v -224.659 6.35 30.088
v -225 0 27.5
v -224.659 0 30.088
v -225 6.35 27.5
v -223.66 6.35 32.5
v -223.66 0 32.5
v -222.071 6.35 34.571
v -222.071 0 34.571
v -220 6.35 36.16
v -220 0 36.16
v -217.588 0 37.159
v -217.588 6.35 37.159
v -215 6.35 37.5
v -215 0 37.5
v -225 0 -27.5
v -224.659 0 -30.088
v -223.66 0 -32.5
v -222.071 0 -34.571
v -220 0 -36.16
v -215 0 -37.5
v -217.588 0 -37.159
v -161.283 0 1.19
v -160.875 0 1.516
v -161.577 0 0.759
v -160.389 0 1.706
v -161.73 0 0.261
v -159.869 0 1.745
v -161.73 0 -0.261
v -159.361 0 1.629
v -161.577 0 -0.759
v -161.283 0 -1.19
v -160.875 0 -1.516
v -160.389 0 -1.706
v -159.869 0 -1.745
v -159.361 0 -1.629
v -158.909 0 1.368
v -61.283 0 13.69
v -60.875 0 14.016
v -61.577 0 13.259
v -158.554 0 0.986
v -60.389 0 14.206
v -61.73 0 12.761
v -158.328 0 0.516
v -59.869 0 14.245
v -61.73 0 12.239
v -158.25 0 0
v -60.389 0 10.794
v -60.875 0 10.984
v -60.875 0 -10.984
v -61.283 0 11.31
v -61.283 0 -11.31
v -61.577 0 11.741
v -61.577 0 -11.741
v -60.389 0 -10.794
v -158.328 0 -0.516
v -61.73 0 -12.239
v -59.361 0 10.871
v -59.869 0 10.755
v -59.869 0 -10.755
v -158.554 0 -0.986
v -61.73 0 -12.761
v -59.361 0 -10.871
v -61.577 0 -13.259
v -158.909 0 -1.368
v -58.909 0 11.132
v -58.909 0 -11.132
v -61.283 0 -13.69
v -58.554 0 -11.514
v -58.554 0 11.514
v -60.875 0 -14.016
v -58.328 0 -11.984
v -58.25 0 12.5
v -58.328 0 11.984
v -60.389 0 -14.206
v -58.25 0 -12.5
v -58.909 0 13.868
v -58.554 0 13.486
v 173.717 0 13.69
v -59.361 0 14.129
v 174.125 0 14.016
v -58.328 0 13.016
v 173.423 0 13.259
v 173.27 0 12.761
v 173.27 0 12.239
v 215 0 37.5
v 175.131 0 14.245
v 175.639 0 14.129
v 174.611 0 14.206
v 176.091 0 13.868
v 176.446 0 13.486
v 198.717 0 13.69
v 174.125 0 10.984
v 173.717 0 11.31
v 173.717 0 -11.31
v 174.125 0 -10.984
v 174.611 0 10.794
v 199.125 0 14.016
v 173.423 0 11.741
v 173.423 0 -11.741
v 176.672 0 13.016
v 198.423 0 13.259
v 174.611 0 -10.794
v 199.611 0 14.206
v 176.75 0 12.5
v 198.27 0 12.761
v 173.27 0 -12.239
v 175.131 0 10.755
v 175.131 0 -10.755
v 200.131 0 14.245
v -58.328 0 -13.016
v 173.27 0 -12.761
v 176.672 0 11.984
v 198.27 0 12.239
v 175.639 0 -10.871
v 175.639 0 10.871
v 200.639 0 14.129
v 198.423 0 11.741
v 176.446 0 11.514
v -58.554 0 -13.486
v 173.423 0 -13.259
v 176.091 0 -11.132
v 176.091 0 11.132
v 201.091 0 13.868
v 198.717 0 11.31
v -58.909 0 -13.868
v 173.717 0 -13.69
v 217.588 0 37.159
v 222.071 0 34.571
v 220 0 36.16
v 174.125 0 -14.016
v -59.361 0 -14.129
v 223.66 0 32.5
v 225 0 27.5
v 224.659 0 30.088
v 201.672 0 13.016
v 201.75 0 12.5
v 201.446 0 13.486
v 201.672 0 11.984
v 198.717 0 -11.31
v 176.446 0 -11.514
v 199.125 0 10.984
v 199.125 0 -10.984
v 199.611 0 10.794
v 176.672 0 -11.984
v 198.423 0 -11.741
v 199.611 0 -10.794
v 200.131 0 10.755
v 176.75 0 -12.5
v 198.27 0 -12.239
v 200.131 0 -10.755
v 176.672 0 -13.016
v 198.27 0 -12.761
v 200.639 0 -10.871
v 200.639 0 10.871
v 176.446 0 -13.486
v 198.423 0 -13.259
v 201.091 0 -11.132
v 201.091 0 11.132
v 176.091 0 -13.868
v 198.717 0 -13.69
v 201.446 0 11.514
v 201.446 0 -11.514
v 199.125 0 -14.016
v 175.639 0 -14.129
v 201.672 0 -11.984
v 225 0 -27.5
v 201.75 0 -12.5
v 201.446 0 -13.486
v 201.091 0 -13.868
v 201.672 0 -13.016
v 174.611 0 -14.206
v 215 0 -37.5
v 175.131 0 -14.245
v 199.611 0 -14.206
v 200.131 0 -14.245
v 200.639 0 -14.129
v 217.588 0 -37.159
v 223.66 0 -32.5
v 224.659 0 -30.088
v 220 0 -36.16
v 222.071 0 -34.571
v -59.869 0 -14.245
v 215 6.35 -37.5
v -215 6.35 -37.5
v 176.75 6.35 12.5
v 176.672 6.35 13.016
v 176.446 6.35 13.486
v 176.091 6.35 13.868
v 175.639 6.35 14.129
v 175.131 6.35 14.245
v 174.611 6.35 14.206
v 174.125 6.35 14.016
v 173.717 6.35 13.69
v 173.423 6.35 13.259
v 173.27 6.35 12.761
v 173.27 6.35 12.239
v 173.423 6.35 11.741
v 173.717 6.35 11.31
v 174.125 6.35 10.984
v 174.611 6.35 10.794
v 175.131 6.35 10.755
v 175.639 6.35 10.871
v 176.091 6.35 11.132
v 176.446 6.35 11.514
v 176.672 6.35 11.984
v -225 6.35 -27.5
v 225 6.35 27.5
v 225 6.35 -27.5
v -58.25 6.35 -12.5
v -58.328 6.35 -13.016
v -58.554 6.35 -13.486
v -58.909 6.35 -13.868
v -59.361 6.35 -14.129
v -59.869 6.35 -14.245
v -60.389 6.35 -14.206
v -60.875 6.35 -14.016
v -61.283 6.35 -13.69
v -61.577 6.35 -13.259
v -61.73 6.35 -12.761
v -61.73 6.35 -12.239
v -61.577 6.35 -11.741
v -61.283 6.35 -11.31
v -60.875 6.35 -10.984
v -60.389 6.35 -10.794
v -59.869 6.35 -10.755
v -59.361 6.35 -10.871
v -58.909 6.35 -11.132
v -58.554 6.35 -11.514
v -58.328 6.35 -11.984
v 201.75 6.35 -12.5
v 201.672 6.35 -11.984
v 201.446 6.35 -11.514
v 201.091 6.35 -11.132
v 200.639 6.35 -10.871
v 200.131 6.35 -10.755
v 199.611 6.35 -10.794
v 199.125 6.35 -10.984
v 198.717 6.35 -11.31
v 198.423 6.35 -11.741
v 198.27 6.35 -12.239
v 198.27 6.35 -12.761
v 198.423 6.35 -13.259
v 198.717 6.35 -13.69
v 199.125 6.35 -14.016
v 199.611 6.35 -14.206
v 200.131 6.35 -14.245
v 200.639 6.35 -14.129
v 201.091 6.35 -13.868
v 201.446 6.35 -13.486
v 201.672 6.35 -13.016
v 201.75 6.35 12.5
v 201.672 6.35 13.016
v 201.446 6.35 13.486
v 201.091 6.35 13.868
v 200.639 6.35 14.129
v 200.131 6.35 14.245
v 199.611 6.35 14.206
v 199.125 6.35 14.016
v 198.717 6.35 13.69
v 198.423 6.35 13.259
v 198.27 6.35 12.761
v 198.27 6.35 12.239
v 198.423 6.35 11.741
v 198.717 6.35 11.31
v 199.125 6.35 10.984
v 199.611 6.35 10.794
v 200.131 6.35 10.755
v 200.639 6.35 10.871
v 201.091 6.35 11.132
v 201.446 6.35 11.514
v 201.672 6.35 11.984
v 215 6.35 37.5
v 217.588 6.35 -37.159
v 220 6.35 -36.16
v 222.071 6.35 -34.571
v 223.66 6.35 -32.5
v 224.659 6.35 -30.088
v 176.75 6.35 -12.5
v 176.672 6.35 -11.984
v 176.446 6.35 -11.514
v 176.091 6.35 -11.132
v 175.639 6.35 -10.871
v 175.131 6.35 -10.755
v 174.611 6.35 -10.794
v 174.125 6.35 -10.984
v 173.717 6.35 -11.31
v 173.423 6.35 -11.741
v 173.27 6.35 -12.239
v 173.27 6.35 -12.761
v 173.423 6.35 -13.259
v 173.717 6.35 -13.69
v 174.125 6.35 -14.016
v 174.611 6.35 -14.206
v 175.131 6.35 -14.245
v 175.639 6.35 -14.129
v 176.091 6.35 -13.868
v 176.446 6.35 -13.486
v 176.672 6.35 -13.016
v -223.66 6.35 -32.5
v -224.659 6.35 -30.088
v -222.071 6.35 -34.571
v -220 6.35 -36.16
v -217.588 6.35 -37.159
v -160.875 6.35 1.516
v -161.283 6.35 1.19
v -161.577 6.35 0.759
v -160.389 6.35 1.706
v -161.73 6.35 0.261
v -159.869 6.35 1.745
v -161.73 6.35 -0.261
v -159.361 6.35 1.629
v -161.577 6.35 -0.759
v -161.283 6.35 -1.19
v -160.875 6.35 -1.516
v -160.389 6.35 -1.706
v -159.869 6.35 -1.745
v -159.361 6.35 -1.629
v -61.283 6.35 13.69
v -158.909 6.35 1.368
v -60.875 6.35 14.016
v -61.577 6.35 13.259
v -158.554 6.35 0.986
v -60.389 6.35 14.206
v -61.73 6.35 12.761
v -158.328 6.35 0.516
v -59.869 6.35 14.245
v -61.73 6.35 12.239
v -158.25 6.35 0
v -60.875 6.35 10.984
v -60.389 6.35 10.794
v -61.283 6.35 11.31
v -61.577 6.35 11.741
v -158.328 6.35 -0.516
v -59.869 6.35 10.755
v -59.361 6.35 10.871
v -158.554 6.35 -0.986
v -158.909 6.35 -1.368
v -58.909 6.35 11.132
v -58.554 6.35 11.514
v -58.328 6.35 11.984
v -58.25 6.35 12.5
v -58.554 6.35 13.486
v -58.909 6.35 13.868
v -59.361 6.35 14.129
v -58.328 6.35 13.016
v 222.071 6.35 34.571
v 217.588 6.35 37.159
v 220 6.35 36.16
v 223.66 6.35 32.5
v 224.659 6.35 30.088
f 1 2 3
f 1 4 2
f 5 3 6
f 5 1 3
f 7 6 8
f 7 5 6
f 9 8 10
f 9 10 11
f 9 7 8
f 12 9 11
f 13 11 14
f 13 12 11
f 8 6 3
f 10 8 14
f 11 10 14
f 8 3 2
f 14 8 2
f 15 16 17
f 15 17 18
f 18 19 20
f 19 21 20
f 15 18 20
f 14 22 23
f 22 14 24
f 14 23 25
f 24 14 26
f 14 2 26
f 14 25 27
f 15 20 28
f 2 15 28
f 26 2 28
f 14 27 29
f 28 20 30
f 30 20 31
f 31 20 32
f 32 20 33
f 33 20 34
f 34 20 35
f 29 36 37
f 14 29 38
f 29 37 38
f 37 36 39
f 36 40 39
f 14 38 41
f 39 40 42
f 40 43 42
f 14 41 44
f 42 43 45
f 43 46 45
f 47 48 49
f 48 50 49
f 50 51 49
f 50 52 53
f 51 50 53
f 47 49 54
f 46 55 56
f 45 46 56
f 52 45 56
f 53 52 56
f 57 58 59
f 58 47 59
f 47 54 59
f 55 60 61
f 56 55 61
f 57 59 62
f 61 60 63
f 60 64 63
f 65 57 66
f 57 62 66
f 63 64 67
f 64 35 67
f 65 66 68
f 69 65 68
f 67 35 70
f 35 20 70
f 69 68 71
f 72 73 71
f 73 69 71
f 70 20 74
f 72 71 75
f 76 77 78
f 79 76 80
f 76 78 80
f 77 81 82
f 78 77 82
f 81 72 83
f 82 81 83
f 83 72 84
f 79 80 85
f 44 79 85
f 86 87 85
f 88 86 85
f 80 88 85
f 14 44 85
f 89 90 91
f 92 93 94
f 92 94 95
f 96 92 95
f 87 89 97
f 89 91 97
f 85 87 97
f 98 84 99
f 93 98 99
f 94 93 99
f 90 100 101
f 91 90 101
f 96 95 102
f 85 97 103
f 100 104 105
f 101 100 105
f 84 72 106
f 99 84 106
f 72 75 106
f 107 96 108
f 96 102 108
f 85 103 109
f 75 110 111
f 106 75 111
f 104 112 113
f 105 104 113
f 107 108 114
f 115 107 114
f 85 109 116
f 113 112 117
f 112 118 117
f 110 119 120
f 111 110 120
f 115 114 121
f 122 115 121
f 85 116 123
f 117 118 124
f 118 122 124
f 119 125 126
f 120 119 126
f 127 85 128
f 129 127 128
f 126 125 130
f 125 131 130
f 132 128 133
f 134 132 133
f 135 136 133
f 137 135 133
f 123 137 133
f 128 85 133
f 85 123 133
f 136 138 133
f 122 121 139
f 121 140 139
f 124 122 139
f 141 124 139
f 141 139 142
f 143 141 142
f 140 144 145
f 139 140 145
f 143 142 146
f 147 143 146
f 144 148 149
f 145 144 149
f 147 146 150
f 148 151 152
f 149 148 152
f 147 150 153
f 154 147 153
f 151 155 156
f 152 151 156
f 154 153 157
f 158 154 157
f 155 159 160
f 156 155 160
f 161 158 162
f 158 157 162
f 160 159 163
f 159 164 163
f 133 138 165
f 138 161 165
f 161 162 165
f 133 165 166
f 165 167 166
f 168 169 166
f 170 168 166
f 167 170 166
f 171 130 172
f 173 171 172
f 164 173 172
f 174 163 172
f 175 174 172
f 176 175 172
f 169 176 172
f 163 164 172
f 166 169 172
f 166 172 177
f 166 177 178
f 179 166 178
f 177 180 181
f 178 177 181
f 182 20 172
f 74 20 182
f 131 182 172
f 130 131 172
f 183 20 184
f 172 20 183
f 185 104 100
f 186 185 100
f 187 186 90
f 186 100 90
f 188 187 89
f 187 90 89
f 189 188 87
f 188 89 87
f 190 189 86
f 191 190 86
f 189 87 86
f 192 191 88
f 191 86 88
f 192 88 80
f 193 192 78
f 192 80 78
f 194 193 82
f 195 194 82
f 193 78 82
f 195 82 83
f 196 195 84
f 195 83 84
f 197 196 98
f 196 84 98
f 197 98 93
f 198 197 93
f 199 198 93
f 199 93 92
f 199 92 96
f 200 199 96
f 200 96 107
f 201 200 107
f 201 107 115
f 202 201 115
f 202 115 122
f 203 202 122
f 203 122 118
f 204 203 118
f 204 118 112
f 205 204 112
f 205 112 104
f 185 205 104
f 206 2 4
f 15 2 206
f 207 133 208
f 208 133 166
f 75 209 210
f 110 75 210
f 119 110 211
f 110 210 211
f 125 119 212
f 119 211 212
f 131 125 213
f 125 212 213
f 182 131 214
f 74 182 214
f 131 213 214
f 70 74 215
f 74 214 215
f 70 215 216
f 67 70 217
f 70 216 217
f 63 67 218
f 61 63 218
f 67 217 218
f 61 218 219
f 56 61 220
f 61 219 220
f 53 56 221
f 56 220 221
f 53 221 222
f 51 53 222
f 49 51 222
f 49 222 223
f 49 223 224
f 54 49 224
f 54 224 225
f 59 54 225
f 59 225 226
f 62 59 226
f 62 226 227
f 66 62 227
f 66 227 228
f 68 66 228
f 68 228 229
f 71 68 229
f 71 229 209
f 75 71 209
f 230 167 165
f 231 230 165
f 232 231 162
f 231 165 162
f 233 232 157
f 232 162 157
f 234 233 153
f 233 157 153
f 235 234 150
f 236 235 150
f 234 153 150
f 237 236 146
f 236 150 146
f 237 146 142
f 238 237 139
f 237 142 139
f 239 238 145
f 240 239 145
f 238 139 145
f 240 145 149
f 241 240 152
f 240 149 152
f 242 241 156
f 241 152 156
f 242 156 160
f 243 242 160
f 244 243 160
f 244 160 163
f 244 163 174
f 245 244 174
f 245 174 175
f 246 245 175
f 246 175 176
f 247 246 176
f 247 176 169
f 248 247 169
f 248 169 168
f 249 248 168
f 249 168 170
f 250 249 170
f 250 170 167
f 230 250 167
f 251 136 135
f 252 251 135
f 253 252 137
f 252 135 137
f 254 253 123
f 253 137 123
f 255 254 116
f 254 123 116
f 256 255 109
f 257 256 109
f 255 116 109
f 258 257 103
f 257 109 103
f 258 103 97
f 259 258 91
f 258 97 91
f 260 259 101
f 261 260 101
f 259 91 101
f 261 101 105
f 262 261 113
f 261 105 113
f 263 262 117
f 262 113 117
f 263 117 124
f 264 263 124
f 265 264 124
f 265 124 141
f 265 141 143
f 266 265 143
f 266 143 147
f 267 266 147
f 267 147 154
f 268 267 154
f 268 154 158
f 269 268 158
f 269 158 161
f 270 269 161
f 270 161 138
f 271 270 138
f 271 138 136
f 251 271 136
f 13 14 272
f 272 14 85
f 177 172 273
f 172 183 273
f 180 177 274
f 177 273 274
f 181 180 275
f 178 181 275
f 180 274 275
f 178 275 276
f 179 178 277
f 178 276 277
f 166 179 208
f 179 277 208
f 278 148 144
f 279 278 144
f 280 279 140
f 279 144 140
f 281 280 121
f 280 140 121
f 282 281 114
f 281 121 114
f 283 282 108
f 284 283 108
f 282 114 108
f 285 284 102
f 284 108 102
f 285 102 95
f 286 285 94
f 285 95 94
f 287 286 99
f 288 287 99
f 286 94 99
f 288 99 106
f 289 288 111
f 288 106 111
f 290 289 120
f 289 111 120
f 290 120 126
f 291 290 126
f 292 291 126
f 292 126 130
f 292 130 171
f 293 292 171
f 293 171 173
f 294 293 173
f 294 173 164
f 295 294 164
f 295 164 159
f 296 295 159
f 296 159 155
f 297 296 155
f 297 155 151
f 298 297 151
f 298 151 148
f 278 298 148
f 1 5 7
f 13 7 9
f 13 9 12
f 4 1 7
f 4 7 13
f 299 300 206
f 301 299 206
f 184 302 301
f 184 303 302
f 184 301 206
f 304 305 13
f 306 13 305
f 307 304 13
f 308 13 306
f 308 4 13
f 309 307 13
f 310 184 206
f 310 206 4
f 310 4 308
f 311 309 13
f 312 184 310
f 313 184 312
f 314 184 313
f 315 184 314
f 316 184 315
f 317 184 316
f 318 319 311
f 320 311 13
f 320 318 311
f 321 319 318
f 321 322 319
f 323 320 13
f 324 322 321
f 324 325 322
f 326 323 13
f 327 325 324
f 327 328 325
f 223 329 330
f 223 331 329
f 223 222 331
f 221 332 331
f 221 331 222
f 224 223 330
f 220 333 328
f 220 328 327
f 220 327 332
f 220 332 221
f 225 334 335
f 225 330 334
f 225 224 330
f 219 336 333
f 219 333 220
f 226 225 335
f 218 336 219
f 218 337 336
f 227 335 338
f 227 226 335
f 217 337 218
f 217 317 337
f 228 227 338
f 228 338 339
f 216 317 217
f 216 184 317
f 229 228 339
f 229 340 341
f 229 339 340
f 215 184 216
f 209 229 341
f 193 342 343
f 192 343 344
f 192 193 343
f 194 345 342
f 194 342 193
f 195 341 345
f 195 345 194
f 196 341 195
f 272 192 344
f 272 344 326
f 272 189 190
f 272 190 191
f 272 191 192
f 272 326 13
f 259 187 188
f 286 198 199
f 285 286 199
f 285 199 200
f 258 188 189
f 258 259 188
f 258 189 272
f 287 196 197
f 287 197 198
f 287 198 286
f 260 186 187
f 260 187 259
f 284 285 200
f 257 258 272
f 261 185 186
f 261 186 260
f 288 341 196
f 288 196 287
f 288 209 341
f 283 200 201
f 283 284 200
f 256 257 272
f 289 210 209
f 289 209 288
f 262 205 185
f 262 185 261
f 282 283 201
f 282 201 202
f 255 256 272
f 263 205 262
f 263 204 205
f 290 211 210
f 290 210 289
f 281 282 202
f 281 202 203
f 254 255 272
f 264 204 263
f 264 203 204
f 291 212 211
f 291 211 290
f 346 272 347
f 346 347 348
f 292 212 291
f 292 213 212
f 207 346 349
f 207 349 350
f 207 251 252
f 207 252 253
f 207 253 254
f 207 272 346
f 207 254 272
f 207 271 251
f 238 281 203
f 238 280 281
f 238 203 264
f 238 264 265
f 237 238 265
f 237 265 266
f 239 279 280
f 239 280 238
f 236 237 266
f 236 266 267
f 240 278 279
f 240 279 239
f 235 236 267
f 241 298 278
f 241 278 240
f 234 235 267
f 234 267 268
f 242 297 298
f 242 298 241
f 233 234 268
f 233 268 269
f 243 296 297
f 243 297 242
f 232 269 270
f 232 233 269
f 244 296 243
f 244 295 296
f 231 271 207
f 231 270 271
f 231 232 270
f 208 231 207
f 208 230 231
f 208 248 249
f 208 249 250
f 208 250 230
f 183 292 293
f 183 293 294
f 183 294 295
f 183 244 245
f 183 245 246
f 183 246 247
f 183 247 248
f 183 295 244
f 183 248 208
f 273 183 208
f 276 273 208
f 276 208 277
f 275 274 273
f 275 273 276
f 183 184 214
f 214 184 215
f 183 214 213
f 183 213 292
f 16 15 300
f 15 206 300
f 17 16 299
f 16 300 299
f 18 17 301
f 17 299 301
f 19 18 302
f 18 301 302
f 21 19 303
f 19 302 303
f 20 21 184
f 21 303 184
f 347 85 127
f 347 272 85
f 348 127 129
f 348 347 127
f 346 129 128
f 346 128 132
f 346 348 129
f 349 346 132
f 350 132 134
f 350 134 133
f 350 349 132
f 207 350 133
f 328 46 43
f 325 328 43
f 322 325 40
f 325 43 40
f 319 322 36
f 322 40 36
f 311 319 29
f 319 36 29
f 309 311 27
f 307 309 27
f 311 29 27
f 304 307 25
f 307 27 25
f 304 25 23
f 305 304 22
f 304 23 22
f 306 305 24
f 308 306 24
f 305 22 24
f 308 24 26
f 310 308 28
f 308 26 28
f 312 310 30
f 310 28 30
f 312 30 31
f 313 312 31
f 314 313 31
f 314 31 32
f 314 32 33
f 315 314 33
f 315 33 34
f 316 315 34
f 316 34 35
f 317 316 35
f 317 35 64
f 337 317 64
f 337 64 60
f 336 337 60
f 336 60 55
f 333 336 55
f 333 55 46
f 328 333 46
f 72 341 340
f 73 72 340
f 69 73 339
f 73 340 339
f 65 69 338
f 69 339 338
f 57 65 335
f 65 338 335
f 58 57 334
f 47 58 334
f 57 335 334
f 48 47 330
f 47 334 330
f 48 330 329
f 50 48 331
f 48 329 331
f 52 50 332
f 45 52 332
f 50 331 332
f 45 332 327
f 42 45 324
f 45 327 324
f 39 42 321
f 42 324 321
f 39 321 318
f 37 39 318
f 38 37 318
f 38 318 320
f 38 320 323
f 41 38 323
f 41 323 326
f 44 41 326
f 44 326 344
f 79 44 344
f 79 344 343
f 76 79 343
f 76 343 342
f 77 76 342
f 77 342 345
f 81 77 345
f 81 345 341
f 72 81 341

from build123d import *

# Parameters (mm, degrees)
SKETCH12_W                = 450
SKETCH12_H                = 75
BOSS_EXTRUDE2_DEPTH       = 6.35
SKETCH13_R                = 1.75
CUT_EXTRUDE1_DEPTH        = 7.35
LPATTERN1_COUNT           = 2
LPATTERN1_PITCH           = 25
LPATTERN2_COUNT           = 2
LPATTERN2_PITCH           = 25
LPATTERN2_COPY_1_SKETCH_R = 1.75
LPATTERN2_COPY_1_DEPTH    = 7.35
SKETCH15_R                = 1.75
CUT_EXTRUDE2_DEPTH        = 7.35
FILLET1_R                 = 10
SKETCH17_R                = 1.75
CUT_EXTRUDE3_DEPTH        = 7.35


with BuildPart() as part:
    # Sketch12 → Boss-Extrude2 (new body)
    with BuildSketch(Plane(origin=(0, 0, 0), x_dir=(1, 0, 0), z_dir=(0, 1, 0))):
        Rectangle(SKETCH12_W, SKETCH12_H)
    extrude(amount=BOSS_EXTRUDE2_DEPTH)

    # Sketch13 → Cut-Extrude1 (cut, through all)
    with BuildSketch(Plane.XZ):
        with Locations((175, -12.5)):
            Circle(SKETCH13_R)
    cut_extrude1 = extrude(amount=-CUT_EXTRUDE1_DEPTH, mode=Mode.SUBTRACT)

    # LPattern1: Cut-Extrude1 ×2
    with Locations(*[(i * LPATTERN1_PITCH, 0, 0) for i in range(1, LPATTERN1_COUNT)]):
        add(cut_extrude1, mode=Mode.SUBTRACT)

    # LPattern2: Cut-Extrude1 ×2
    with Locations(*[(0, 0, i * LPATTERN2_PITCH) for i in range(1, LPATTERN2_COUNT)]):
        add(cut_extrude1, mode=Mode.SUBTRACT)

    # LPattern2 copy 1 sketch → LPattern2 copy 1 (cut, through all)
    with BuildSketch(Plane(origin=(25, 0, 25), x_dir=(1, 0, 0), z_dir=(0, -1, 0))):
        with Locations((175, -12.5)):
            Circle(LPATTERN2_COPY_1_SKETCH_R)
    extrude(amount=-LPATTERN2_COPY_1_DEPTH, mode=Mode.SUBTRACT)

    # Sketch15 → Cut-Extrude2 (cut, through all)
    with BuildSketch(Plane.XZ):
        with Locations((-160, 0)):
            Circle(SKETCH15_R)
    extrude(amount=-CUT_EXTRUDE2_DEPTH, mode=Mode.SUBTRACT)

    # Fillet1
    fillet1_edges = [part.edges().sort_by_distance(p)[0] for p in [
        (225, 3.175, 37.5),
        (-225, 3.175, 37.5),
        (-225, 3.175, -37.5),
        (225, 3.175, -37.5),
    ]]
    fillet(fillet1_edges, radius=FILLET1_R)

    # Sketch17 → Cut-Extrude3 (cut, through all)
    with BuildSketch(Plane(origin=(0, 6.35, 0), x_dir=(1, 0, 0), z_dir=(0, 1, 0))):
        with Locations((-60, 12.5)):
            Circle(SKETCH17_R)
        with Locations((-60, -12.5)):
            Circle(SKETCH17_R)
    extrude(amount=-CUT_EXTRUDE3_DEPTH, mode=Mode.SUBTRACT)


solid = part.part
